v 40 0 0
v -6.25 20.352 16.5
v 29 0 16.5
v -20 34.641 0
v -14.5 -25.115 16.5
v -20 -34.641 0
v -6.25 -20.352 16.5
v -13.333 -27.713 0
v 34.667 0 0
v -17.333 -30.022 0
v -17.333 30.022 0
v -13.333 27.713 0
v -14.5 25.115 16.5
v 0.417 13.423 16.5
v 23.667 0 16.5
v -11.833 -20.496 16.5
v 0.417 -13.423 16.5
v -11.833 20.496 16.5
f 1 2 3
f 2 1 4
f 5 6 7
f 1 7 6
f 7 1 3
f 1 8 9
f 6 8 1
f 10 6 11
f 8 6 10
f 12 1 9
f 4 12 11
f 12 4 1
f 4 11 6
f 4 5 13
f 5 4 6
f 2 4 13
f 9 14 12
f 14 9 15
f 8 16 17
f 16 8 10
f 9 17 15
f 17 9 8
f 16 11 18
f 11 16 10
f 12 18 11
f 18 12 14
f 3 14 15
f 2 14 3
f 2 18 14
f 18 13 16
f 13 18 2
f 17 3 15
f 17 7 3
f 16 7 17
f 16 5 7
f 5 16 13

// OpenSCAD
//_______________________________________________________________________
//__/ __/ __/ __/ __/ __/ __/ __/ __/ __/ __/ __/ __/ __/ __/ __/ __/ __/
/*
   Rubik's cube support   
   
   Dessiné par Jean-Pierre Perroud  -  (jpp)
   Version     1.3
   
   Date        24-01-2018
   Révison     28-01-2018 
   Remques     Support de table pour présenter le Rubilk's cube
               La pyramide est crée avec un cylindre dont $fn=3 
               pour avoir 3 faces ! 
               Attention, pour cubes standard, avec surfaces non arrondies !!!
*/            

//-----------------------------------------------------------------------
//--- VARIABLES 
/* [VARIABLES] */

O    =    0;   // Origine avec un O majuscule  (pas un 0)
T    =   40;   // Taille de la base ....  (rayon du cylindre ...)
$fn  =  100;   // Finition générale !!!
haut = 16.5;   // Hauteur de la pièce souhaitée ...
base =    0;   // [0:sans ouverture, 1:avec l'ouverture] 
               // 0 ou 1,  sans ou avec découpe. Si 1 alors 
               // ne pas oublier d'ajouter les supports à l'impression :)

//-----------------------------------------------------------------------
//--- DEBUT DU CODE

color("Red")                           // Juste pour le fun avec OpenSCAD  :)
difference(){
   translate    ([O, O, O])            // Cylindre tranformé en pyramide 
      cylinder  (T, T, T/3, $fn=3);    // avec $fn=3 pour avoir les 3 faces
   translate    ([O, O, -8])           // Cylindre tranformé en pyramide 
      cylinder  (T, T, T/3, $fn=3);     // avec $fn=3 pour faire l'extrusion 

   if (base){
      translate ([O, O, O-T/1.5])      // Spère pour le dessous si base = 1
         sphere (T/1, center=true);
   };

// Plateau pour découper la pyramide à la hauteur de ...
   translate   ([O, O, O+(T/2+haut)])  // Mise à la hauteur !
      cube     ([T*2,T*2,T],center=true);
   
};


//-----------------------------------------------------------------------
//--- FIN DU CODE  --  j-p perroud

//__/ __/ __/ __/ __/ __/ __/ __/ __/ __/ __/ __/ __/ __/ __/ __/ __/ __/
//_______________________________________________________________________
